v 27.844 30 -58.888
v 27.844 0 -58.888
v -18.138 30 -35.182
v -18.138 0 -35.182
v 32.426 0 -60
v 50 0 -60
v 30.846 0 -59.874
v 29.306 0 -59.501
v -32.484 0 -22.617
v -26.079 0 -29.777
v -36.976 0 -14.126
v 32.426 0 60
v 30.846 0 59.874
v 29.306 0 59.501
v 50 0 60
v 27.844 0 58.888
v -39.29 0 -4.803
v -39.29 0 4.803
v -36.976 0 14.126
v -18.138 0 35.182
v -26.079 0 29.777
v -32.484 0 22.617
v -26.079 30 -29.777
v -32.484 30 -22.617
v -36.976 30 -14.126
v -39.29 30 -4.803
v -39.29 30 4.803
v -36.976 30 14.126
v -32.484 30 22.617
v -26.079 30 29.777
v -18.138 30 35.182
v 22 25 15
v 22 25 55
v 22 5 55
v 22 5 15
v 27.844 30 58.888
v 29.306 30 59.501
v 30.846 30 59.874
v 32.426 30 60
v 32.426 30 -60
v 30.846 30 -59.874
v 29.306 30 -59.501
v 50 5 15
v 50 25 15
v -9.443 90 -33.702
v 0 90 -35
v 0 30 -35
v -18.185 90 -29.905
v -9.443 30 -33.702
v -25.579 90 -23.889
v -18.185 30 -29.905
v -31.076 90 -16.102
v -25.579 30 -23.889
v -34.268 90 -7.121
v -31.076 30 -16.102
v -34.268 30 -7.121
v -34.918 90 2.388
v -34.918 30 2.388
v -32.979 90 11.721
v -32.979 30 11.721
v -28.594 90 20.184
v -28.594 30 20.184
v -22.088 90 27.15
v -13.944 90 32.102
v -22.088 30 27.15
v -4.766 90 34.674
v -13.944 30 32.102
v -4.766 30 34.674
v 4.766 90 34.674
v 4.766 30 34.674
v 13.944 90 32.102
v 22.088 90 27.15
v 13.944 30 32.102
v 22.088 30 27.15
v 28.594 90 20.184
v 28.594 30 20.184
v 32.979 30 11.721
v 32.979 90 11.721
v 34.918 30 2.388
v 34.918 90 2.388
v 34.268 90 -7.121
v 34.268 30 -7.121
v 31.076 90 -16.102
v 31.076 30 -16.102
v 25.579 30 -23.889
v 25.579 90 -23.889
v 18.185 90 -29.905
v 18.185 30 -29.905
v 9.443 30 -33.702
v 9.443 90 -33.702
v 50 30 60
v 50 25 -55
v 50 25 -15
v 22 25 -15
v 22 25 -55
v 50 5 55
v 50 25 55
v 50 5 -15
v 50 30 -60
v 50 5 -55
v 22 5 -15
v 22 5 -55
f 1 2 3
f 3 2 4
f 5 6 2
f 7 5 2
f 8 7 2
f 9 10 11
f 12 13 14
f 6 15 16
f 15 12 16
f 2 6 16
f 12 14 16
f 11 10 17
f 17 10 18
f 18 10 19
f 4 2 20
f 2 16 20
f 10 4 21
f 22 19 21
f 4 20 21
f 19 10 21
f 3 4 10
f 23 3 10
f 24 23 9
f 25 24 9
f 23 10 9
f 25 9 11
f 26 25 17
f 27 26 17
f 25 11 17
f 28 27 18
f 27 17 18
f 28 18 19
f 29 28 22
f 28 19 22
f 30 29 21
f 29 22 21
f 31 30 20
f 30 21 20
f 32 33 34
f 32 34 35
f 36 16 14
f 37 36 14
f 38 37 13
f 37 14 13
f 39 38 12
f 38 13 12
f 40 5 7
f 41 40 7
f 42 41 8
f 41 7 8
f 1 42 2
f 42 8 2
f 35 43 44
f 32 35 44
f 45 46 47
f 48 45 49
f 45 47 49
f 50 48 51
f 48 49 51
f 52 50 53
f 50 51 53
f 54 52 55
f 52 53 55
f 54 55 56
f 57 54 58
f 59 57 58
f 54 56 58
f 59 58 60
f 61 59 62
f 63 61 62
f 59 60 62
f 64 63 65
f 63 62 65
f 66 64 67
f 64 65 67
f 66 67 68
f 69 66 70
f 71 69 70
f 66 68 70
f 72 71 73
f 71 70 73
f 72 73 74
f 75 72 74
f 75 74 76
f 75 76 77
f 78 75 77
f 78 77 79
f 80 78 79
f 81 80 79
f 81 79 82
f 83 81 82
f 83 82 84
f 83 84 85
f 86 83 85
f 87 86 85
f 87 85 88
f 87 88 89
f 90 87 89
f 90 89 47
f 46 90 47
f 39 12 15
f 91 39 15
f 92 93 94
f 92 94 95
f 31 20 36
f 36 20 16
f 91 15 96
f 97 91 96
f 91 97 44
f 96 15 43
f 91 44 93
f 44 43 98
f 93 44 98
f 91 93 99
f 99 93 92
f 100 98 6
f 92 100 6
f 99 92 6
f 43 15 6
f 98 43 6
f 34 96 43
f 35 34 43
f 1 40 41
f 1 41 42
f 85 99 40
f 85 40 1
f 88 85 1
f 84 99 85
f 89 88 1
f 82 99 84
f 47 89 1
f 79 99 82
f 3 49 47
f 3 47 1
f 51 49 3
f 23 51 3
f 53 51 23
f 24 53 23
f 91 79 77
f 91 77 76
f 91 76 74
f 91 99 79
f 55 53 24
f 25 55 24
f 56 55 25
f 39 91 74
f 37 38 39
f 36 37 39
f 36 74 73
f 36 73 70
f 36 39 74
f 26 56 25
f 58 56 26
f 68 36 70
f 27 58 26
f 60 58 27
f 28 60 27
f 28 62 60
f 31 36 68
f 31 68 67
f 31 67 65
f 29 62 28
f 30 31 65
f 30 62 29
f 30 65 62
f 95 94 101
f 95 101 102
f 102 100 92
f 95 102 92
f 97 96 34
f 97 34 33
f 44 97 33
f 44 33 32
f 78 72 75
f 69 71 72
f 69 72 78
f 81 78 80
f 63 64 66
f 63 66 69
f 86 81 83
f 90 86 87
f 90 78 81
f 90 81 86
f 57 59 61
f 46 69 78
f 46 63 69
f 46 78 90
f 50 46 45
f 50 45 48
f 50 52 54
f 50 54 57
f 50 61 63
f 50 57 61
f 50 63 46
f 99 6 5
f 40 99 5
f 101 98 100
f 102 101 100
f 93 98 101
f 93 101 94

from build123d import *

# Parameters (mm, degrees)
CROQUIS1_R              = 35
SALIENTE_EXTRUIR1_DEPTH = 90
SALIENTE_EXTRUIR2_DEPTH = 30
CROQUIS3_W              = 40
CROQUIS3_H              = 20
CORTAR_EXTRUIR1_DEPTH   = 28


with BuildPart() as part:
    # Croquis1 → Saliente-Extruir1 (new body)
    with BuildSketch(Plane(origin=(0, 0, 0), x_dir=(1, 0, 0), z_dir=(0, 1, 0))):
        with Locations(Location((0, 0, 0), (0, 0, 90))):
            Circle(CROQUIS1_R)
    extrude(amount=SALIENTE_EXTRUIR1_DEPTH)

    # Croquis2 → Saliente-Extruir2 (add)
    with BuildSketch(Plane.XZ):
        with BuildLine():
            Line((50, 60), (50, -60))
            Line((50, -60), (32.42606327, -60))
            ThreePointArc((32.42606327, -60), (30.068391754, -59.718095751), (27.843647762, -58.888277005))
            Line((27.843647762, -58.888277005), (-18.138307464, -35.181947356))
            ThreePointArc((-18.138307464, -35.181947356), (-39.582415507, 0), (-18.138307464, 35.181947356))
            Line((-18.138307464, 35.181947356), (27.843647762, 58.888277005))
            ThreePointArc((27.843647762, 58.888277005), (30.068391754, 59.718095751), (32.42606327, 60))
            Line((32.42606327, 60), (50, 60))
        make_face()
    extrude(amount=-SALIENTE_EXTRUIR2_DEPTH)

    # Croquis3 → Cortar-Extruir1 (cut)
    with BuildSketch(Plane(origin=(50, 0, 0), x_dir=(0, 0, -1), z_dir=(1, 0, 0))):
        with Locations((-35, 15)):
            Rectangle(CROQUIS3_W, CROQUIS3_H)
        with Locations((35, 15)):
            Rectangle(CROQUIS3_W, CROQUIS3_H)
    extrude(amount=-CORTAR_EXTRUIR1_DEPTH, mode=Mode.SUBTRACT)


solid = part.part
